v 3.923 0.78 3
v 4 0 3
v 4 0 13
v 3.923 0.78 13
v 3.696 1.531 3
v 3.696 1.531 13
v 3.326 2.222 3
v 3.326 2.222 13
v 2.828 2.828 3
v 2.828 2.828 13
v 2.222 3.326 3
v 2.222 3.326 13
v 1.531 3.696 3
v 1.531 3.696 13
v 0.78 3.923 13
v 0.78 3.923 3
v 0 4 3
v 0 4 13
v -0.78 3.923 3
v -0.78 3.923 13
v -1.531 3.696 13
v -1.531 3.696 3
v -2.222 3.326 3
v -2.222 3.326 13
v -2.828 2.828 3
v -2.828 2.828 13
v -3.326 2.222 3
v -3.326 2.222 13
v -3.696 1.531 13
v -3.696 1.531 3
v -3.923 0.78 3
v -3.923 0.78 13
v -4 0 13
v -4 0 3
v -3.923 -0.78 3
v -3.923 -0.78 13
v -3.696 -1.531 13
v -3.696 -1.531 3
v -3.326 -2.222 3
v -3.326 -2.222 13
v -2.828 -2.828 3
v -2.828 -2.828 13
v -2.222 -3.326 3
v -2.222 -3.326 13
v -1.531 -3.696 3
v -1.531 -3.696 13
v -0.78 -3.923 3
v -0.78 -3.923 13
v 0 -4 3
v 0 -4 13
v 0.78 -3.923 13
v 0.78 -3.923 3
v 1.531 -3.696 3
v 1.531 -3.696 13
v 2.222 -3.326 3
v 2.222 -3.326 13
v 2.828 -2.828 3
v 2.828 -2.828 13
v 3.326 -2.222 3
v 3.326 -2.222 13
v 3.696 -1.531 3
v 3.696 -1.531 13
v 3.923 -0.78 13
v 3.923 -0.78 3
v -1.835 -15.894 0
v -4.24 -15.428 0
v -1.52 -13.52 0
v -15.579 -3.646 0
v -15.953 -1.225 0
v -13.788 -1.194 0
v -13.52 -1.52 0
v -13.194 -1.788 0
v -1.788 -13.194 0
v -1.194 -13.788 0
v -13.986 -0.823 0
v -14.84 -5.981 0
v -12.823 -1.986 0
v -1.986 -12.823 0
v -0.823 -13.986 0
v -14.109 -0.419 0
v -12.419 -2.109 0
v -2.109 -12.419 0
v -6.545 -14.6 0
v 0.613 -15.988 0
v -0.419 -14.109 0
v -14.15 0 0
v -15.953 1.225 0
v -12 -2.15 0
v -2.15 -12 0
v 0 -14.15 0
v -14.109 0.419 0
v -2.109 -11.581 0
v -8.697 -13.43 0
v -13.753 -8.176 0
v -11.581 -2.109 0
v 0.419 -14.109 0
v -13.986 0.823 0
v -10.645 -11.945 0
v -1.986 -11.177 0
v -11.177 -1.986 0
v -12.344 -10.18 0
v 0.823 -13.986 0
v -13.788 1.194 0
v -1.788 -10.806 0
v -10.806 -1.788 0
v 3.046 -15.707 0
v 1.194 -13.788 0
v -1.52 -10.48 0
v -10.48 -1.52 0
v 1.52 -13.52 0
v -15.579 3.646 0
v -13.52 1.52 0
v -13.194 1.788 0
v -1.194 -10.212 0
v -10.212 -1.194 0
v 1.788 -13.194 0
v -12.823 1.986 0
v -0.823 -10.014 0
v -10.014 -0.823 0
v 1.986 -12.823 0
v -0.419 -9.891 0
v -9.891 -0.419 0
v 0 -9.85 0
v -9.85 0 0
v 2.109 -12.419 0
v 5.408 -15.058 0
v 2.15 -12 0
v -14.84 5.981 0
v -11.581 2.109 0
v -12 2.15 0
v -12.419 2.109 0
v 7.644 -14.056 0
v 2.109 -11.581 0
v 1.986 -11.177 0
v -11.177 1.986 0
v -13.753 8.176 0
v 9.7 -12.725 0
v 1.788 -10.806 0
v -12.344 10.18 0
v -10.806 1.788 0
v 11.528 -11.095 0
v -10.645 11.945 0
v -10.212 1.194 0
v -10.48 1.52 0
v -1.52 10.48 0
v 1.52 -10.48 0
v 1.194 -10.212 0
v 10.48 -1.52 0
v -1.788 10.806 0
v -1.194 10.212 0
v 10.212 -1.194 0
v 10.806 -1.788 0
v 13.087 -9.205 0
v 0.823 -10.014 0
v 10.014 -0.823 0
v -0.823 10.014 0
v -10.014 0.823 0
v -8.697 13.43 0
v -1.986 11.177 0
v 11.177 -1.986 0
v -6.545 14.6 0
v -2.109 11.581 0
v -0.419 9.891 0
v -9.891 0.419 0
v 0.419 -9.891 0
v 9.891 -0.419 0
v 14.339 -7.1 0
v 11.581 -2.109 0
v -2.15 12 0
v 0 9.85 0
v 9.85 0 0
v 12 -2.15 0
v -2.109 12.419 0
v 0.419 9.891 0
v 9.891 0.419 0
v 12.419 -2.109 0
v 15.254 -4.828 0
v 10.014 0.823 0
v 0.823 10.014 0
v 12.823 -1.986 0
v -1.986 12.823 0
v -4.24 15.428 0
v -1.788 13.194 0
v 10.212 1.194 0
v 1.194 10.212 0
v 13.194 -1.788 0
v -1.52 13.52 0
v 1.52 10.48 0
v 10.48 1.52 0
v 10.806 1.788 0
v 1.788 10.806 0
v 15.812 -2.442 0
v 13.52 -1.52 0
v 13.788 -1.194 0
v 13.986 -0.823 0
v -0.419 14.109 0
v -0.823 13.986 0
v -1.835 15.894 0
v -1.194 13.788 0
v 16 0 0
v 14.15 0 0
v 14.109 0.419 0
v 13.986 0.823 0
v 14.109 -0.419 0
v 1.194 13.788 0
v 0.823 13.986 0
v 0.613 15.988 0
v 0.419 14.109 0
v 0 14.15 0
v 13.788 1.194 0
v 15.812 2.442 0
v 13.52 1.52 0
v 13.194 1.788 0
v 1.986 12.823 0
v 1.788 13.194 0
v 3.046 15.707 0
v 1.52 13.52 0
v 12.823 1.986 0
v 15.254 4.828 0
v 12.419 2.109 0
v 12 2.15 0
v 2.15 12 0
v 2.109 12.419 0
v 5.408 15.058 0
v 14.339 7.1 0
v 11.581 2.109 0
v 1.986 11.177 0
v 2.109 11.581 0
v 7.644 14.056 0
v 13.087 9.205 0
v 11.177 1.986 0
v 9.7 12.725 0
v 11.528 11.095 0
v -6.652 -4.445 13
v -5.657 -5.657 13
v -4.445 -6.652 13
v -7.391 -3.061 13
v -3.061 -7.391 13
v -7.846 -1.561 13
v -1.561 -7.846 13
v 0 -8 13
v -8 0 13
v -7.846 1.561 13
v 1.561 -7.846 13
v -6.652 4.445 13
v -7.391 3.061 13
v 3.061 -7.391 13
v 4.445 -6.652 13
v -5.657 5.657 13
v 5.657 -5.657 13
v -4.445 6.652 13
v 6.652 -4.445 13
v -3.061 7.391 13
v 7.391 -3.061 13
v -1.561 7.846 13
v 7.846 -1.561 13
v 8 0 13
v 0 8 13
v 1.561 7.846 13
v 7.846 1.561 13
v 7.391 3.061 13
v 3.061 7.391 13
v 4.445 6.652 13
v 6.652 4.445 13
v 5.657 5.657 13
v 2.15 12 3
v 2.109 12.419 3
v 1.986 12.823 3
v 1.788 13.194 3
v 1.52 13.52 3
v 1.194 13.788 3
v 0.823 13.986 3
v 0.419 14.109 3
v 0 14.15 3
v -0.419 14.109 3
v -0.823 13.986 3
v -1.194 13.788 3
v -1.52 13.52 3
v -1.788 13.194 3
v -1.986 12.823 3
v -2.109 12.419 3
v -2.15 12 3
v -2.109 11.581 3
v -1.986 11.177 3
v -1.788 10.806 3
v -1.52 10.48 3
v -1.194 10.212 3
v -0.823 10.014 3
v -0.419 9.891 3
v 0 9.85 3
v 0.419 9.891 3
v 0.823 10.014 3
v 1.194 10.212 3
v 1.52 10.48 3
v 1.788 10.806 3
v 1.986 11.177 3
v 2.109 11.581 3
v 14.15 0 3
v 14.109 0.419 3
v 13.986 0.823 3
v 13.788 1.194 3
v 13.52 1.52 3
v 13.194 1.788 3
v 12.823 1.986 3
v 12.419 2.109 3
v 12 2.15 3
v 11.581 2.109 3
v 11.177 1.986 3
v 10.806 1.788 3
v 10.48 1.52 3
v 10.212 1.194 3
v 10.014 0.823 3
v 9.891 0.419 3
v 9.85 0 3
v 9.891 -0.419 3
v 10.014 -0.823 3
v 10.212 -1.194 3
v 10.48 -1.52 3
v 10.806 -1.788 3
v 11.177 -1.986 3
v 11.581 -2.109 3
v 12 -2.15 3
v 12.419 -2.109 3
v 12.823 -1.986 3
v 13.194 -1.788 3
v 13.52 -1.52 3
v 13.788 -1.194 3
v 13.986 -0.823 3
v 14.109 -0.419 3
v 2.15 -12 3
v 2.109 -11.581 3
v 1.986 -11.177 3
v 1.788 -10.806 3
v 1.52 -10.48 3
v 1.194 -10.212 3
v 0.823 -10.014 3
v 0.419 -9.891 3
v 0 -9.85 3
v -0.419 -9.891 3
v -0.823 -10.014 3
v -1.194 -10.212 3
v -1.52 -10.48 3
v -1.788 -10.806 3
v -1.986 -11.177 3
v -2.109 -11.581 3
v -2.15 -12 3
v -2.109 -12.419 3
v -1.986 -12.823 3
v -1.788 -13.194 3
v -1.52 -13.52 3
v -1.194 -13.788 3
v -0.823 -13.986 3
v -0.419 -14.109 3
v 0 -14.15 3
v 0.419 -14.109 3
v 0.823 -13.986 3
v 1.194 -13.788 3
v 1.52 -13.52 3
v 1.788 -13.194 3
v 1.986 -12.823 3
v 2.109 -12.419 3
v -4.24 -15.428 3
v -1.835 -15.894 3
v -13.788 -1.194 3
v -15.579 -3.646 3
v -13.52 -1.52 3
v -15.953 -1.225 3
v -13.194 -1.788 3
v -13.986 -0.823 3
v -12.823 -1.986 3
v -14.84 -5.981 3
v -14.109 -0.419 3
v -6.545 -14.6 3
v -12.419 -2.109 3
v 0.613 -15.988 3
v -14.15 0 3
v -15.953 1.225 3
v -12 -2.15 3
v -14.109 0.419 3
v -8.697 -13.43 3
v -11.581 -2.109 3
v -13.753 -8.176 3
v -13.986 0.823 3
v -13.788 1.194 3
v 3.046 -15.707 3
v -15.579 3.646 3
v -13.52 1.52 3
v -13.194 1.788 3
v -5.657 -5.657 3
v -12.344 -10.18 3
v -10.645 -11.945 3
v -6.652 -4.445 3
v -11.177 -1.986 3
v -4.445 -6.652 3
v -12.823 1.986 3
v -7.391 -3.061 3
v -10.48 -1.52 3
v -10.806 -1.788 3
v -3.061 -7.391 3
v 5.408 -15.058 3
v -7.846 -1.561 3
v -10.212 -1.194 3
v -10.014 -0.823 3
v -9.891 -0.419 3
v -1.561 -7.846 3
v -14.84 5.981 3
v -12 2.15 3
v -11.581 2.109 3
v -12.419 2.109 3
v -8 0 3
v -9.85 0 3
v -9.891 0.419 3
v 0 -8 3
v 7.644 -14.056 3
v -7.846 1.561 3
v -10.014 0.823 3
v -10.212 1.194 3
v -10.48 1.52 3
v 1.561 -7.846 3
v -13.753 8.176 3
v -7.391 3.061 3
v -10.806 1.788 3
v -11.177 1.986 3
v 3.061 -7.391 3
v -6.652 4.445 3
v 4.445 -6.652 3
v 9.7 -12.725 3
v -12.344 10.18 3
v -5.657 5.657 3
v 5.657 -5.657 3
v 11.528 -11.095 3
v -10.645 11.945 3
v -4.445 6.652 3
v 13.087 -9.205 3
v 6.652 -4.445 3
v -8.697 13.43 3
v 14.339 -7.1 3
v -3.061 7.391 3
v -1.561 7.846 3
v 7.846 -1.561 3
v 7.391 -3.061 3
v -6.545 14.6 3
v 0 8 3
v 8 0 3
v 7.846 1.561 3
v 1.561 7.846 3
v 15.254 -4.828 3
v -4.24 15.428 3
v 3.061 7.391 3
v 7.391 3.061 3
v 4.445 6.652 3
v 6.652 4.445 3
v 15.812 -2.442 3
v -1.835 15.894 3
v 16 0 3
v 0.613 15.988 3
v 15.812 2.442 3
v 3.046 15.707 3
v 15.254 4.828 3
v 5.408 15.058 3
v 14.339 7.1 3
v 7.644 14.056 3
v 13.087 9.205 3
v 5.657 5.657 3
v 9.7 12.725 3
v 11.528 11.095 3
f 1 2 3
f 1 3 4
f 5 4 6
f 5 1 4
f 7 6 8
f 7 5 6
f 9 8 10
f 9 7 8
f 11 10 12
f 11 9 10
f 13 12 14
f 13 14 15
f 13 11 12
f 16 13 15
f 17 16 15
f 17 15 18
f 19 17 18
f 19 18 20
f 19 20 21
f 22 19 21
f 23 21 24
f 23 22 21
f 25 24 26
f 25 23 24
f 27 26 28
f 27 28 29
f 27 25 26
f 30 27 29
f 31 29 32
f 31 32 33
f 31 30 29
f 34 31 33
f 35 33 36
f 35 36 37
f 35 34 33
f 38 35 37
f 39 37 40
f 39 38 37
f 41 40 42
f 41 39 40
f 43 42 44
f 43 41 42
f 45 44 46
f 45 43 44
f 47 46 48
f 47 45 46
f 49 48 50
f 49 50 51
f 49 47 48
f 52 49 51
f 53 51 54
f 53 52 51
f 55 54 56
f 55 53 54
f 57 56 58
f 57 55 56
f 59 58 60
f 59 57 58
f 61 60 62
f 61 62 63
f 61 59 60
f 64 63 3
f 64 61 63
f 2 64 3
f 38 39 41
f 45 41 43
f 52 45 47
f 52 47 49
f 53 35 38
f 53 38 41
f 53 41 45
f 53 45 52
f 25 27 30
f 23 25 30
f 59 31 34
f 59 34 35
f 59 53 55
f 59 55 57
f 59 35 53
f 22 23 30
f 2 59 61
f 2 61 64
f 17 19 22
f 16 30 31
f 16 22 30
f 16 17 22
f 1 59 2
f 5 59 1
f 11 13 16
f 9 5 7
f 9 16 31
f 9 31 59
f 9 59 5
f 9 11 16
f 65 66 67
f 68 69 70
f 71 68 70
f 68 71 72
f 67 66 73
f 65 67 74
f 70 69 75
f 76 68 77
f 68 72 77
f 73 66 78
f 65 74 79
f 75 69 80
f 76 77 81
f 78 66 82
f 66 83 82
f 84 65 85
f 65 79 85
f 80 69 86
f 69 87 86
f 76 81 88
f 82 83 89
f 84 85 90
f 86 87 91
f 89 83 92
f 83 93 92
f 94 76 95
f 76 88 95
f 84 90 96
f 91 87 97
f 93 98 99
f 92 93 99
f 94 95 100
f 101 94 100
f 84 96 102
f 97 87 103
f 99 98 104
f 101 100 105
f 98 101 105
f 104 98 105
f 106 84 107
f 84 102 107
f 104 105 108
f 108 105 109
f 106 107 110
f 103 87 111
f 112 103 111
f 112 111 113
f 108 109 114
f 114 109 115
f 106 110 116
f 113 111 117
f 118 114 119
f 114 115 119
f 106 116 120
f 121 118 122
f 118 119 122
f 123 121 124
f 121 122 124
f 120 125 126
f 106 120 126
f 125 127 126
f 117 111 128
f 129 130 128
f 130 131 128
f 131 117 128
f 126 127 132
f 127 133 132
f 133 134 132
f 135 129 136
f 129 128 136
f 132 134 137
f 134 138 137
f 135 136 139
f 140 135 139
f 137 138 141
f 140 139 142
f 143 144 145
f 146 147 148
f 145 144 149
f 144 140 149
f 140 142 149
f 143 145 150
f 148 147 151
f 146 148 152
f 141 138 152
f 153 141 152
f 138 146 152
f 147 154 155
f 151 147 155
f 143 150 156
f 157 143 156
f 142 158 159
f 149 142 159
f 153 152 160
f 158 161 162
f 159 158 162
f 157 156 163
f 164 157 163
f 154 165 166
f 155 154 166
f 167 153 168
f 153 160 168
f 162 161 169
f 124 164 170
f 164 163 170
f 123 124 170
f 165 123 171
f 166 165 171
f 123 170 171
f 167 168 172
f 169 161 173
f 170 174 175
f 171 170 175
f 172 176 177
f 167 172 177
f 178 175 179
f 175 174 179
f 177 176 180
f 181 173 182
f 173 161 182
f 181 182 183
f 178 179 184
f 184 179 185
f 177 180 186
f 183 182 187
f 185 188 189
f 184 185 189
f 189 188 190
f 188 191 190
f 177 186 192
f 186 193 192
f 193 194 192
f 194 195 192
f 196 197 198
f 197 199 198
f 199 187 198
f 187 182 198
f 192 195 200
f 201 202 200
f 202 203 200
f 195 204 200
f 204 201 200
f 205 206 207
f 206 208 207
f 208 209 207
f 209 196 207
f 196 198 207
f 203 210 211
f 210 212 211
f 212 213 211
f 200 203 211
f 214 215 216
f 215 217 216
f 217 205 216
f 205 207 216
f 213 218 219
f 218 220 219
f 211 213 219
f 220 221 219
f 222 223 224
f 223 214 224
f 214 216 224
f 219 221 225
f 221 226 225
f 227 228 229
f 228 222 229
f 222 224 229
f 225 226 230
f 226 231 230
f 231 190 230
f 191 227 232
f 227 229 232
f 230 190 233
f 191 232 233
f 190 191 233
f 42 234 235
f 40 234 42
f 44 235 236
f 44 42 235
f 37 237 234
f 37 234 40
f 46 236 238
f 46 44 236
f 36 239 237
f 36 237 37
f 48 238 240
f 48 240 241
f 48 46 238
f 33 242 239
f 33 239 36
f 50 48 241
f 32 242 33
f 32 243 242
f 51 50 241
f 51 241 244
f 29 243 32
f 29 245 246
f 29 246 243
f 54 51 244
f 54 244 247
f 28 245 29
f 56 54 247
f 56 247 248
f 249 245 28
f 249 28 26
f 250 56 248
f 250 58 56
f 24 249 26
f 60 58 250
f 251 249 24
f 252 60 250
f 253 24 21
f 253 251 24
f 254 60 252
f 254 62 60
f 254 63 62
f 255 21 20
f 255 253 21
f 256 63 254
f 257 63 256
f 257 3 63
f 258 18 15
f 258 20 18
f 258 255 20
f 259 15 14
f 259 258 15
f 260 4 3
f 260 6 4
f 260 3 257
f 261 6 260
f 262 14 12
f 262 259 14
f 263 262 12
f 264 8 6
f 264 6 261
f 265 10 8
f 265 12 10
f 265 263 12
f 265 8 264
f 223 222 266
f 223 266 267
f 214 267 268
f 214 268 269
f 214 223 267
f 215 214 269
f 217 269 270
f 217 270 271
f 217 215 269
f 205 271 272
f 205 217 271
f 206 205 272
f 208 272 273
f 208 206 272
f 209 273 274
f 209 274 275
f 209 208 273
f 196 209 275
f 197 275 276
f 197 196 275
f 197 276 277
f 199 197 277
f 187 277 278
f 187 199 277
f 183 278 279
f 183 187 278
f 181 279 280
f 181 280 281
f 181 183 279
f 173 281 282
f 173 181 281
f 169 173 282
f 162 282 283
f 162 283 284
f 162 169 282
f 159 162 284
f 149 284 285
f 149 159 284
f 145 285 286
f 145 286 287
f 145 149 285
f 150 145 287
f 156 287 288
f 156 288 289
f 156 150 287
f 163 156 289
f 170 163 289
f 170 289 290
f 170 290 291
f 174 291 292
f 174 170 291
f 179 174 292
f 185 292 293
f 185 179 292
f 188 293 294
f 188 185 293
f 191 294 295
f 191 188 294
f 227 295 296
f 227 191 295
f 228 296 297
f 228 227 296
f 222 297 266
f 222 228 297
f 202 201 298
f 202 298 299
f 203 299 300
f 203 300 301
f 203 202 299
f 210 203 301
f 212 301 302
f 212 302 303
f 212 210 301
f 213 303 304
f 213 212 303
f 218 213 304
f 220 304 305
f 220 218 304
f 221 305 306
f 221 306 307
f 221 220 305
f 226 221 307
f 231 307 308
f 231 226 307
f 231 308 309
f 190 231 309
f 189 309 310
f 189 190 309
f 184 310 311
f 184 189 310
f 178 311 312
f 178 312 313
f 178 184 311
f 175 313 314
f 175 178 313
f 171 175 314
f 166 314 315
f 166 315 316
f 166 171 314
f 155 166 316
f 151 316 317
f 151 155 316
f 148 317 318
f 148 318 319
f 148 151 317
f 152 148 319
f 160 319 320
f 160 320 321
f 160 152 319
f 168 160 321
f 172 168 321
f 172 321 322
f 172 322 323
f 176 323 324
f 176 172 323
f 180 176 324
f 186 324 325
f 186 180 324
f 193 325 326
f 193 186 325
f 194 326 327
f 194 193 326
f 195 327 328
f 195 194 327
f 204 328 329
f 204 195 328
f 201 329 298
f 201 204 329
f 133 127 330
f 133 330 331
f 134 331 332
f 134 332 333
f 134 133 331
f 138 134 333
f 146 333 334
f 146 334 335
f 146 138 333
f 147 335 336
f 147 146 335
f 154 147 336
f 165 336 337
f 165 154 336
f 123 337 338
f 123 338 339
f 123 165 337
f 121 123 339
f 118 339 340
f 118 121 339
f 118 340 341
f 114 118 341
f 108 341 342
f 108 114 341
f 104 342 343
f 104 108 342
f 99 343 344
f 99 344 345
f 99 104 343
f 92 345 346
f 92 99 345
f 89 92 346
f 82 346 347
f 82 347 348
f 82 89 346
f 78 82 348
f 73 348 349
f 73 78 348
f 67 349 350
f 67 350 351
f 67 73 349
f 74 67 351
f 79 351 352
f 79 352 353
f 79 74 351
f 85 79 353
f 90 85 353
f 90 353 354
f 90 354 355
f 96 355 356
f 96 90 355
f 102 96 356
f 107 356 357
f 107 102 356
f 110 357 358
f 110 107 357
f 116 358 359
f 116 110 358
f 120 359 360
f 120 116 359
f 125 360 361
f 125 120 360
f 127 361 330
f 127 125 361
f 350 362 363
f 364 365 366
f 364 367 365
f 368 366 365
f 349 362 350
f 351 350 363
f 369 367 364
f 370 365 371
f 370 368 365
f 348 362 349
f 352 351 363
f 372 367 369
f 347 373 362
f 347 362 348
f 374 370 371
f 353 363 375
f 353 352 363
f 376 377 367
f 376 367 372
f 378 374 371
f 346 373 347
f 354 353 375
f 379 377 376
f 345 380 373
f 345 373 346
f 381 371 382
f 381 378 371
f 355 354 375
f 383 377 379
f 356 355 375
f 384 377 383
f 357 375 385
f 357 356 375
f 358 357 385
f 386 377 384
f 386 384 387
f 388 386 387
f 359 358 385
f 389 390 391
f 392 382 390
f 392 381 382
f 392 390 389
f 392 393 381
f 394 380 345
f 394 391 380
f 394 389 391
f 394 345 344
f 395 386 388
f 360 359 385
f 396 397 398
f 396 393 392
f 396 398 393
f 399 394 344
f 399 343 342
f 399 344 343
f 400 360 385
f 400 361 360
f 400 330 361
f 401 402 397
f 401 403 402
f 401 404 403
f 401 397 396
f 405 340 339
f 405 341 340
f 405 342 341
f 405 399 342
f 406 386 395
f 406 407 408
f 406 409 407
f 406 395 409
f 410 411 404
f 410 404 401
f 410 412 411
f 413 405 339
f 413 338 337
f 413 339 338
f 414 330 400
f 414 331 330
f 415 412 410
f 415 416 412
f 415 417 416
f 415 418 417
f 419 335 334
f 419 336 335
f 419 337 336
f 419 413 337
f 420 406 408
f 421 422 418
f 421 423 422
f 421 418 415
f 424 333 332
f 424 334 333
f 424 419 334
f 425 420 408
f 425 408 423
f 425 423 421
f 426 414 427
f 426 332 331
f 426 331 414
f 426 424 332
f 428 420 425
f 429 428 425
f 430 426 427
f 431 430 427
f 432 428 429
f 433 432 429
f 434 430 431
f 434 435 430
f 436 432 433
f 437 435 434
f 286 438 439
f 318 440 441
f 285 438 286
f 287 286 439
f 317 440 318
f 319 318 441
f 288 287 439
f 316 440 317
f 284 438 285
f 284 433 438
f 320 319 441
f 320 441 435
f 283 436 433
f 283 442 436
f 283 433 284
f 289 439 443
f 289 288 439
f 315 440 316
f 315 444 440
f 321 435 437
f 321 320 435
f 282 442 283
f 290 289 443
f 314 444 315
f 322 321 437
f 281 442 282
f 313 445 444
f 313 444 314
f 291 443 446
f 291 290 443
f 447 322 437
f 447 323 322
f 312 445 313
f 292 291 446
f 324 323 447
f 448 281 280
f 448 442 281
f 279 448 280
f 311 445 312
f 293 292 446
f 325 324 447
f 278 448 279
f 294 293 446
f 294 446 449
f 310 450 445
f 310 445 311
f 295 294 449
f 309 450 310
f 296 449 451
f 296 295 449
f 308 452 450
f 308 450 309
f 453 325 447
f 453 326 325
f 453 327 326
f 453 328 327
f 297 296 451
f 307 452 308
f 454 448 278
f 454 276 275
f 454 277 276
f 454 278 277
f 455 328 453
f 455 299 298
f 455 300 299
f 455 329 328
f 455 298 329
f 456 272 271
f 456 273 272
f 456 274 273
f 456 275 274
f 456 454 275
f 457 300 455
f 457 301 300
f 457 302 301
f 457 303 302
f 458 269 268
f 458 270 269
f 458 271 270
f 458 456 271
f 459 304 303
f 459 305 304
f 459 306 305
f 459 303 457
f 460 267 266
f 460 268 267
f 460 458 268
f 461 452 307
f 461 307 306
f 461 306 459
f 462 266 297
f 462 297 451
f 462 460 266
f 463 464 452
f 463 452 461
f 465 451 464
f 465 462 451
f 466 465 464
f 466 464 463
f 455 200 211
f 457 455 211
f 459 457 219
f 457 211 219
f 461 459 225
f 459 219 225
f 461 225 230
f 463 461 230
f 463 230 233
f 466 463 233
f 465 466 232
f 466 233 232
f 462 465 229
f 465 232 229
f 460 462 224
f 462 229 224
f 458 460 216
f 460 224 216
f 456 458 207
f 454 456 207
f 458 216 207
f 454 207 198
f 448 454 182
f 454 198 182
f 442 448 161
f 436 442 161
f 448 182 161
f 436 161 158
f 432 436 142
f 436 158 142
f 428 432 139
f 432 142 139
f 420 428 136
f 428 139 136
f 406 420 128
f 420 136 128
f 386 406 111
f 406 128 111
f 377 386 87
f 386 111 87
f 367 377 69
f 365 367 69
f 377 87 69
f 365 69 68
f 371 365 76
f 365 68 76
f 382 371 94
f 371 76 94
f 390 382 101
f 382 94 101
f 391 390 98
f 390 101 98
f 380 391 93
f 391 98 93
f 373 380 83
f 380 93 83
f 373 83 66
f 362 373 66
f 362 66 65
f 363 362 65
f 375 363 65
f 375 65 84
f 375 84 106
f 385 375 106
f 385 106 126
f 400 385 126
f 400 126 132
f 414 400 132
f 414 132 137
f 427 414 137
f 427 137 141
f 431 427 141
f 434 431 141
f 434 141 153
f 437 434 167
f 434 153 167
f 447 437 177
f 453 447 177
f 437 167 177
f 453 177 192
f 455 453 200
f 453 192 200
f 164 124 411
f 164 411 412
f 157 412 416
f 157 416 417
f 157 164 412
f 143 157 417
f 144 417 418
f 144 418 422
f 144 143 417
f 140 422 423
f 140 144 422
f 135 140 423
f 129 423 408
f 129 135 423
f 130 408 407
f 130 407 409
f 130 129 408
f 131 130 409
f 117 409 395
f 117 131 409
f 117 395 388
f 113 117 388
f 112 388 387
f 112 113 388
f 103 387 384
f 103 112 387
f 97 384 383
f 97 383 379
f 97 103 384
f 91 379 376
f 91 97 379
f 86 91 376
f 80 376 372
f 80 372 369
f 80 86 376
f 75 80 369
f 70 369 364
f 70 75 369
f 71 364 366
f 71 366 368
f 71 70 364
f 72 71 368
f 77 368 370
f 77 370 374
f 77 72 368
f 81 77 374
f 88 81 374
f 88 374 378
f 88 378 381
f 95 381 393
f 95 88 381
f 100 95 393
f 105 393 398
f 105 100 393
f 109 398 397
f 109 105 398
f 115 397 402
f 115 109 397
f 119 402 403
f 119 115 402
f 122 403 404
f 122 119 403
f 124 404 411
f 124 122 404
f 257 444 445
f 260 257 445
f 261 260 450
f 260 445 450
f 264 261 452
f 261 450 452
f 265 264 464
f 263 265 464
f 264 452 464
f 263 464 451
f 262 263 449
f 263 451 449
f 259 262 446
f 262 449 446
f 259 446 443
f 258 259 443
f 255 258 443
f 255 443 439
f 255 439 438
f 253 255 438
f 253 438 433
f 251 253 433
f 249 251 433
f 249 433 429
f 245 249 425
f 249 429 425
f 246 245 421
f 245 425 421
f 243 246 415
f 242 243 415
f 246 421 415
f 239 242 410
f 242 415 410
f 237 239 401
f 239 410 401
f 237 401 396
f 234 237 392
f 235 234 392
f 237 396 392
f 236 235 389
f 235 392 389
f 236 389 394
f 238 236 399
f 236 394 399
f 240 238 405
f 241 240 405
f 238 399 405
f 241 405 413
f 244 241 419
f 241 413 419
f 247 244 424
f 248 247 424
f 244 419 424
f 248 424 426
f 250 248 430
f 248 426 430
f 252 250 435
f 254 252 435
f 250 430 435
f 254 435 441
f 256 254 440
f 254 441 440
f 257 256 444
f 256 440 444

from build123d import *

# Parameters (mm, degrees)
SKETCH_1_R      = 16
SKETCH_1_R_2    = 8
SKETCH_1_R_3    = 2.15
SKETCH_1_R_4    = 4
EXTRUDE_2_DEPTH = 3
SKETCH_2_R      = 8
SKETCH_2_R_2    = 4
EXTRUDE_3_DEPTH = 10


with BuildPart() as part:
    # 草图1 → 凸台-拉伸2 (new body)
    # profile 1 of 3: a face of its own
    with BuildSketch(Plane.XY):
        Circle(SKETCH_1_R)
        Circle(SKETCH_1_R_2, mode=Mode.SUBTRACT)
        with Locations((12, 0)):
            Circle(SKETCH_1_R_3, mode=Mode.SUBTRACT)
        with Locations((-12, 0)):
            Circle(SKETCH_1_R_3, mode=Mode.SUBTRACT)
        with Locations((0, -12)):
            Circle(SKETCH_1_R_3, mode=Mode.SUBTRACT)
        with Locations((0, 12)):
            Circle(SKETCH_1_R_3, mode=Mode.SUBTRACT)
    # profile 2 of 3: a face of its own
    with BuildSketch(Plane.XY):
        Circle(SKETCH_1_R_2)
        Circle(SKETCH_1_R_4, mode=Mode.SUBTRACT)
    # profile 3 of 3: a face of its own
    with BuildSketch(Plane.XY):
        Circle(SKETCH_1_R_4)
    extrude(amount=EXTRUDE_2_DEPTH)

    # 草图2 → 凸台-拉伸3 (add)
    with BuildSketch(Plane.XY.offset(3)):
        Circle(SKETCH_2_R)
        Circle(SKETCH_2_R_2, mode=Mode.SUBTRACT)
    extrude(amount=EXTRUDE_3_DEPTH)


solid = part.part
